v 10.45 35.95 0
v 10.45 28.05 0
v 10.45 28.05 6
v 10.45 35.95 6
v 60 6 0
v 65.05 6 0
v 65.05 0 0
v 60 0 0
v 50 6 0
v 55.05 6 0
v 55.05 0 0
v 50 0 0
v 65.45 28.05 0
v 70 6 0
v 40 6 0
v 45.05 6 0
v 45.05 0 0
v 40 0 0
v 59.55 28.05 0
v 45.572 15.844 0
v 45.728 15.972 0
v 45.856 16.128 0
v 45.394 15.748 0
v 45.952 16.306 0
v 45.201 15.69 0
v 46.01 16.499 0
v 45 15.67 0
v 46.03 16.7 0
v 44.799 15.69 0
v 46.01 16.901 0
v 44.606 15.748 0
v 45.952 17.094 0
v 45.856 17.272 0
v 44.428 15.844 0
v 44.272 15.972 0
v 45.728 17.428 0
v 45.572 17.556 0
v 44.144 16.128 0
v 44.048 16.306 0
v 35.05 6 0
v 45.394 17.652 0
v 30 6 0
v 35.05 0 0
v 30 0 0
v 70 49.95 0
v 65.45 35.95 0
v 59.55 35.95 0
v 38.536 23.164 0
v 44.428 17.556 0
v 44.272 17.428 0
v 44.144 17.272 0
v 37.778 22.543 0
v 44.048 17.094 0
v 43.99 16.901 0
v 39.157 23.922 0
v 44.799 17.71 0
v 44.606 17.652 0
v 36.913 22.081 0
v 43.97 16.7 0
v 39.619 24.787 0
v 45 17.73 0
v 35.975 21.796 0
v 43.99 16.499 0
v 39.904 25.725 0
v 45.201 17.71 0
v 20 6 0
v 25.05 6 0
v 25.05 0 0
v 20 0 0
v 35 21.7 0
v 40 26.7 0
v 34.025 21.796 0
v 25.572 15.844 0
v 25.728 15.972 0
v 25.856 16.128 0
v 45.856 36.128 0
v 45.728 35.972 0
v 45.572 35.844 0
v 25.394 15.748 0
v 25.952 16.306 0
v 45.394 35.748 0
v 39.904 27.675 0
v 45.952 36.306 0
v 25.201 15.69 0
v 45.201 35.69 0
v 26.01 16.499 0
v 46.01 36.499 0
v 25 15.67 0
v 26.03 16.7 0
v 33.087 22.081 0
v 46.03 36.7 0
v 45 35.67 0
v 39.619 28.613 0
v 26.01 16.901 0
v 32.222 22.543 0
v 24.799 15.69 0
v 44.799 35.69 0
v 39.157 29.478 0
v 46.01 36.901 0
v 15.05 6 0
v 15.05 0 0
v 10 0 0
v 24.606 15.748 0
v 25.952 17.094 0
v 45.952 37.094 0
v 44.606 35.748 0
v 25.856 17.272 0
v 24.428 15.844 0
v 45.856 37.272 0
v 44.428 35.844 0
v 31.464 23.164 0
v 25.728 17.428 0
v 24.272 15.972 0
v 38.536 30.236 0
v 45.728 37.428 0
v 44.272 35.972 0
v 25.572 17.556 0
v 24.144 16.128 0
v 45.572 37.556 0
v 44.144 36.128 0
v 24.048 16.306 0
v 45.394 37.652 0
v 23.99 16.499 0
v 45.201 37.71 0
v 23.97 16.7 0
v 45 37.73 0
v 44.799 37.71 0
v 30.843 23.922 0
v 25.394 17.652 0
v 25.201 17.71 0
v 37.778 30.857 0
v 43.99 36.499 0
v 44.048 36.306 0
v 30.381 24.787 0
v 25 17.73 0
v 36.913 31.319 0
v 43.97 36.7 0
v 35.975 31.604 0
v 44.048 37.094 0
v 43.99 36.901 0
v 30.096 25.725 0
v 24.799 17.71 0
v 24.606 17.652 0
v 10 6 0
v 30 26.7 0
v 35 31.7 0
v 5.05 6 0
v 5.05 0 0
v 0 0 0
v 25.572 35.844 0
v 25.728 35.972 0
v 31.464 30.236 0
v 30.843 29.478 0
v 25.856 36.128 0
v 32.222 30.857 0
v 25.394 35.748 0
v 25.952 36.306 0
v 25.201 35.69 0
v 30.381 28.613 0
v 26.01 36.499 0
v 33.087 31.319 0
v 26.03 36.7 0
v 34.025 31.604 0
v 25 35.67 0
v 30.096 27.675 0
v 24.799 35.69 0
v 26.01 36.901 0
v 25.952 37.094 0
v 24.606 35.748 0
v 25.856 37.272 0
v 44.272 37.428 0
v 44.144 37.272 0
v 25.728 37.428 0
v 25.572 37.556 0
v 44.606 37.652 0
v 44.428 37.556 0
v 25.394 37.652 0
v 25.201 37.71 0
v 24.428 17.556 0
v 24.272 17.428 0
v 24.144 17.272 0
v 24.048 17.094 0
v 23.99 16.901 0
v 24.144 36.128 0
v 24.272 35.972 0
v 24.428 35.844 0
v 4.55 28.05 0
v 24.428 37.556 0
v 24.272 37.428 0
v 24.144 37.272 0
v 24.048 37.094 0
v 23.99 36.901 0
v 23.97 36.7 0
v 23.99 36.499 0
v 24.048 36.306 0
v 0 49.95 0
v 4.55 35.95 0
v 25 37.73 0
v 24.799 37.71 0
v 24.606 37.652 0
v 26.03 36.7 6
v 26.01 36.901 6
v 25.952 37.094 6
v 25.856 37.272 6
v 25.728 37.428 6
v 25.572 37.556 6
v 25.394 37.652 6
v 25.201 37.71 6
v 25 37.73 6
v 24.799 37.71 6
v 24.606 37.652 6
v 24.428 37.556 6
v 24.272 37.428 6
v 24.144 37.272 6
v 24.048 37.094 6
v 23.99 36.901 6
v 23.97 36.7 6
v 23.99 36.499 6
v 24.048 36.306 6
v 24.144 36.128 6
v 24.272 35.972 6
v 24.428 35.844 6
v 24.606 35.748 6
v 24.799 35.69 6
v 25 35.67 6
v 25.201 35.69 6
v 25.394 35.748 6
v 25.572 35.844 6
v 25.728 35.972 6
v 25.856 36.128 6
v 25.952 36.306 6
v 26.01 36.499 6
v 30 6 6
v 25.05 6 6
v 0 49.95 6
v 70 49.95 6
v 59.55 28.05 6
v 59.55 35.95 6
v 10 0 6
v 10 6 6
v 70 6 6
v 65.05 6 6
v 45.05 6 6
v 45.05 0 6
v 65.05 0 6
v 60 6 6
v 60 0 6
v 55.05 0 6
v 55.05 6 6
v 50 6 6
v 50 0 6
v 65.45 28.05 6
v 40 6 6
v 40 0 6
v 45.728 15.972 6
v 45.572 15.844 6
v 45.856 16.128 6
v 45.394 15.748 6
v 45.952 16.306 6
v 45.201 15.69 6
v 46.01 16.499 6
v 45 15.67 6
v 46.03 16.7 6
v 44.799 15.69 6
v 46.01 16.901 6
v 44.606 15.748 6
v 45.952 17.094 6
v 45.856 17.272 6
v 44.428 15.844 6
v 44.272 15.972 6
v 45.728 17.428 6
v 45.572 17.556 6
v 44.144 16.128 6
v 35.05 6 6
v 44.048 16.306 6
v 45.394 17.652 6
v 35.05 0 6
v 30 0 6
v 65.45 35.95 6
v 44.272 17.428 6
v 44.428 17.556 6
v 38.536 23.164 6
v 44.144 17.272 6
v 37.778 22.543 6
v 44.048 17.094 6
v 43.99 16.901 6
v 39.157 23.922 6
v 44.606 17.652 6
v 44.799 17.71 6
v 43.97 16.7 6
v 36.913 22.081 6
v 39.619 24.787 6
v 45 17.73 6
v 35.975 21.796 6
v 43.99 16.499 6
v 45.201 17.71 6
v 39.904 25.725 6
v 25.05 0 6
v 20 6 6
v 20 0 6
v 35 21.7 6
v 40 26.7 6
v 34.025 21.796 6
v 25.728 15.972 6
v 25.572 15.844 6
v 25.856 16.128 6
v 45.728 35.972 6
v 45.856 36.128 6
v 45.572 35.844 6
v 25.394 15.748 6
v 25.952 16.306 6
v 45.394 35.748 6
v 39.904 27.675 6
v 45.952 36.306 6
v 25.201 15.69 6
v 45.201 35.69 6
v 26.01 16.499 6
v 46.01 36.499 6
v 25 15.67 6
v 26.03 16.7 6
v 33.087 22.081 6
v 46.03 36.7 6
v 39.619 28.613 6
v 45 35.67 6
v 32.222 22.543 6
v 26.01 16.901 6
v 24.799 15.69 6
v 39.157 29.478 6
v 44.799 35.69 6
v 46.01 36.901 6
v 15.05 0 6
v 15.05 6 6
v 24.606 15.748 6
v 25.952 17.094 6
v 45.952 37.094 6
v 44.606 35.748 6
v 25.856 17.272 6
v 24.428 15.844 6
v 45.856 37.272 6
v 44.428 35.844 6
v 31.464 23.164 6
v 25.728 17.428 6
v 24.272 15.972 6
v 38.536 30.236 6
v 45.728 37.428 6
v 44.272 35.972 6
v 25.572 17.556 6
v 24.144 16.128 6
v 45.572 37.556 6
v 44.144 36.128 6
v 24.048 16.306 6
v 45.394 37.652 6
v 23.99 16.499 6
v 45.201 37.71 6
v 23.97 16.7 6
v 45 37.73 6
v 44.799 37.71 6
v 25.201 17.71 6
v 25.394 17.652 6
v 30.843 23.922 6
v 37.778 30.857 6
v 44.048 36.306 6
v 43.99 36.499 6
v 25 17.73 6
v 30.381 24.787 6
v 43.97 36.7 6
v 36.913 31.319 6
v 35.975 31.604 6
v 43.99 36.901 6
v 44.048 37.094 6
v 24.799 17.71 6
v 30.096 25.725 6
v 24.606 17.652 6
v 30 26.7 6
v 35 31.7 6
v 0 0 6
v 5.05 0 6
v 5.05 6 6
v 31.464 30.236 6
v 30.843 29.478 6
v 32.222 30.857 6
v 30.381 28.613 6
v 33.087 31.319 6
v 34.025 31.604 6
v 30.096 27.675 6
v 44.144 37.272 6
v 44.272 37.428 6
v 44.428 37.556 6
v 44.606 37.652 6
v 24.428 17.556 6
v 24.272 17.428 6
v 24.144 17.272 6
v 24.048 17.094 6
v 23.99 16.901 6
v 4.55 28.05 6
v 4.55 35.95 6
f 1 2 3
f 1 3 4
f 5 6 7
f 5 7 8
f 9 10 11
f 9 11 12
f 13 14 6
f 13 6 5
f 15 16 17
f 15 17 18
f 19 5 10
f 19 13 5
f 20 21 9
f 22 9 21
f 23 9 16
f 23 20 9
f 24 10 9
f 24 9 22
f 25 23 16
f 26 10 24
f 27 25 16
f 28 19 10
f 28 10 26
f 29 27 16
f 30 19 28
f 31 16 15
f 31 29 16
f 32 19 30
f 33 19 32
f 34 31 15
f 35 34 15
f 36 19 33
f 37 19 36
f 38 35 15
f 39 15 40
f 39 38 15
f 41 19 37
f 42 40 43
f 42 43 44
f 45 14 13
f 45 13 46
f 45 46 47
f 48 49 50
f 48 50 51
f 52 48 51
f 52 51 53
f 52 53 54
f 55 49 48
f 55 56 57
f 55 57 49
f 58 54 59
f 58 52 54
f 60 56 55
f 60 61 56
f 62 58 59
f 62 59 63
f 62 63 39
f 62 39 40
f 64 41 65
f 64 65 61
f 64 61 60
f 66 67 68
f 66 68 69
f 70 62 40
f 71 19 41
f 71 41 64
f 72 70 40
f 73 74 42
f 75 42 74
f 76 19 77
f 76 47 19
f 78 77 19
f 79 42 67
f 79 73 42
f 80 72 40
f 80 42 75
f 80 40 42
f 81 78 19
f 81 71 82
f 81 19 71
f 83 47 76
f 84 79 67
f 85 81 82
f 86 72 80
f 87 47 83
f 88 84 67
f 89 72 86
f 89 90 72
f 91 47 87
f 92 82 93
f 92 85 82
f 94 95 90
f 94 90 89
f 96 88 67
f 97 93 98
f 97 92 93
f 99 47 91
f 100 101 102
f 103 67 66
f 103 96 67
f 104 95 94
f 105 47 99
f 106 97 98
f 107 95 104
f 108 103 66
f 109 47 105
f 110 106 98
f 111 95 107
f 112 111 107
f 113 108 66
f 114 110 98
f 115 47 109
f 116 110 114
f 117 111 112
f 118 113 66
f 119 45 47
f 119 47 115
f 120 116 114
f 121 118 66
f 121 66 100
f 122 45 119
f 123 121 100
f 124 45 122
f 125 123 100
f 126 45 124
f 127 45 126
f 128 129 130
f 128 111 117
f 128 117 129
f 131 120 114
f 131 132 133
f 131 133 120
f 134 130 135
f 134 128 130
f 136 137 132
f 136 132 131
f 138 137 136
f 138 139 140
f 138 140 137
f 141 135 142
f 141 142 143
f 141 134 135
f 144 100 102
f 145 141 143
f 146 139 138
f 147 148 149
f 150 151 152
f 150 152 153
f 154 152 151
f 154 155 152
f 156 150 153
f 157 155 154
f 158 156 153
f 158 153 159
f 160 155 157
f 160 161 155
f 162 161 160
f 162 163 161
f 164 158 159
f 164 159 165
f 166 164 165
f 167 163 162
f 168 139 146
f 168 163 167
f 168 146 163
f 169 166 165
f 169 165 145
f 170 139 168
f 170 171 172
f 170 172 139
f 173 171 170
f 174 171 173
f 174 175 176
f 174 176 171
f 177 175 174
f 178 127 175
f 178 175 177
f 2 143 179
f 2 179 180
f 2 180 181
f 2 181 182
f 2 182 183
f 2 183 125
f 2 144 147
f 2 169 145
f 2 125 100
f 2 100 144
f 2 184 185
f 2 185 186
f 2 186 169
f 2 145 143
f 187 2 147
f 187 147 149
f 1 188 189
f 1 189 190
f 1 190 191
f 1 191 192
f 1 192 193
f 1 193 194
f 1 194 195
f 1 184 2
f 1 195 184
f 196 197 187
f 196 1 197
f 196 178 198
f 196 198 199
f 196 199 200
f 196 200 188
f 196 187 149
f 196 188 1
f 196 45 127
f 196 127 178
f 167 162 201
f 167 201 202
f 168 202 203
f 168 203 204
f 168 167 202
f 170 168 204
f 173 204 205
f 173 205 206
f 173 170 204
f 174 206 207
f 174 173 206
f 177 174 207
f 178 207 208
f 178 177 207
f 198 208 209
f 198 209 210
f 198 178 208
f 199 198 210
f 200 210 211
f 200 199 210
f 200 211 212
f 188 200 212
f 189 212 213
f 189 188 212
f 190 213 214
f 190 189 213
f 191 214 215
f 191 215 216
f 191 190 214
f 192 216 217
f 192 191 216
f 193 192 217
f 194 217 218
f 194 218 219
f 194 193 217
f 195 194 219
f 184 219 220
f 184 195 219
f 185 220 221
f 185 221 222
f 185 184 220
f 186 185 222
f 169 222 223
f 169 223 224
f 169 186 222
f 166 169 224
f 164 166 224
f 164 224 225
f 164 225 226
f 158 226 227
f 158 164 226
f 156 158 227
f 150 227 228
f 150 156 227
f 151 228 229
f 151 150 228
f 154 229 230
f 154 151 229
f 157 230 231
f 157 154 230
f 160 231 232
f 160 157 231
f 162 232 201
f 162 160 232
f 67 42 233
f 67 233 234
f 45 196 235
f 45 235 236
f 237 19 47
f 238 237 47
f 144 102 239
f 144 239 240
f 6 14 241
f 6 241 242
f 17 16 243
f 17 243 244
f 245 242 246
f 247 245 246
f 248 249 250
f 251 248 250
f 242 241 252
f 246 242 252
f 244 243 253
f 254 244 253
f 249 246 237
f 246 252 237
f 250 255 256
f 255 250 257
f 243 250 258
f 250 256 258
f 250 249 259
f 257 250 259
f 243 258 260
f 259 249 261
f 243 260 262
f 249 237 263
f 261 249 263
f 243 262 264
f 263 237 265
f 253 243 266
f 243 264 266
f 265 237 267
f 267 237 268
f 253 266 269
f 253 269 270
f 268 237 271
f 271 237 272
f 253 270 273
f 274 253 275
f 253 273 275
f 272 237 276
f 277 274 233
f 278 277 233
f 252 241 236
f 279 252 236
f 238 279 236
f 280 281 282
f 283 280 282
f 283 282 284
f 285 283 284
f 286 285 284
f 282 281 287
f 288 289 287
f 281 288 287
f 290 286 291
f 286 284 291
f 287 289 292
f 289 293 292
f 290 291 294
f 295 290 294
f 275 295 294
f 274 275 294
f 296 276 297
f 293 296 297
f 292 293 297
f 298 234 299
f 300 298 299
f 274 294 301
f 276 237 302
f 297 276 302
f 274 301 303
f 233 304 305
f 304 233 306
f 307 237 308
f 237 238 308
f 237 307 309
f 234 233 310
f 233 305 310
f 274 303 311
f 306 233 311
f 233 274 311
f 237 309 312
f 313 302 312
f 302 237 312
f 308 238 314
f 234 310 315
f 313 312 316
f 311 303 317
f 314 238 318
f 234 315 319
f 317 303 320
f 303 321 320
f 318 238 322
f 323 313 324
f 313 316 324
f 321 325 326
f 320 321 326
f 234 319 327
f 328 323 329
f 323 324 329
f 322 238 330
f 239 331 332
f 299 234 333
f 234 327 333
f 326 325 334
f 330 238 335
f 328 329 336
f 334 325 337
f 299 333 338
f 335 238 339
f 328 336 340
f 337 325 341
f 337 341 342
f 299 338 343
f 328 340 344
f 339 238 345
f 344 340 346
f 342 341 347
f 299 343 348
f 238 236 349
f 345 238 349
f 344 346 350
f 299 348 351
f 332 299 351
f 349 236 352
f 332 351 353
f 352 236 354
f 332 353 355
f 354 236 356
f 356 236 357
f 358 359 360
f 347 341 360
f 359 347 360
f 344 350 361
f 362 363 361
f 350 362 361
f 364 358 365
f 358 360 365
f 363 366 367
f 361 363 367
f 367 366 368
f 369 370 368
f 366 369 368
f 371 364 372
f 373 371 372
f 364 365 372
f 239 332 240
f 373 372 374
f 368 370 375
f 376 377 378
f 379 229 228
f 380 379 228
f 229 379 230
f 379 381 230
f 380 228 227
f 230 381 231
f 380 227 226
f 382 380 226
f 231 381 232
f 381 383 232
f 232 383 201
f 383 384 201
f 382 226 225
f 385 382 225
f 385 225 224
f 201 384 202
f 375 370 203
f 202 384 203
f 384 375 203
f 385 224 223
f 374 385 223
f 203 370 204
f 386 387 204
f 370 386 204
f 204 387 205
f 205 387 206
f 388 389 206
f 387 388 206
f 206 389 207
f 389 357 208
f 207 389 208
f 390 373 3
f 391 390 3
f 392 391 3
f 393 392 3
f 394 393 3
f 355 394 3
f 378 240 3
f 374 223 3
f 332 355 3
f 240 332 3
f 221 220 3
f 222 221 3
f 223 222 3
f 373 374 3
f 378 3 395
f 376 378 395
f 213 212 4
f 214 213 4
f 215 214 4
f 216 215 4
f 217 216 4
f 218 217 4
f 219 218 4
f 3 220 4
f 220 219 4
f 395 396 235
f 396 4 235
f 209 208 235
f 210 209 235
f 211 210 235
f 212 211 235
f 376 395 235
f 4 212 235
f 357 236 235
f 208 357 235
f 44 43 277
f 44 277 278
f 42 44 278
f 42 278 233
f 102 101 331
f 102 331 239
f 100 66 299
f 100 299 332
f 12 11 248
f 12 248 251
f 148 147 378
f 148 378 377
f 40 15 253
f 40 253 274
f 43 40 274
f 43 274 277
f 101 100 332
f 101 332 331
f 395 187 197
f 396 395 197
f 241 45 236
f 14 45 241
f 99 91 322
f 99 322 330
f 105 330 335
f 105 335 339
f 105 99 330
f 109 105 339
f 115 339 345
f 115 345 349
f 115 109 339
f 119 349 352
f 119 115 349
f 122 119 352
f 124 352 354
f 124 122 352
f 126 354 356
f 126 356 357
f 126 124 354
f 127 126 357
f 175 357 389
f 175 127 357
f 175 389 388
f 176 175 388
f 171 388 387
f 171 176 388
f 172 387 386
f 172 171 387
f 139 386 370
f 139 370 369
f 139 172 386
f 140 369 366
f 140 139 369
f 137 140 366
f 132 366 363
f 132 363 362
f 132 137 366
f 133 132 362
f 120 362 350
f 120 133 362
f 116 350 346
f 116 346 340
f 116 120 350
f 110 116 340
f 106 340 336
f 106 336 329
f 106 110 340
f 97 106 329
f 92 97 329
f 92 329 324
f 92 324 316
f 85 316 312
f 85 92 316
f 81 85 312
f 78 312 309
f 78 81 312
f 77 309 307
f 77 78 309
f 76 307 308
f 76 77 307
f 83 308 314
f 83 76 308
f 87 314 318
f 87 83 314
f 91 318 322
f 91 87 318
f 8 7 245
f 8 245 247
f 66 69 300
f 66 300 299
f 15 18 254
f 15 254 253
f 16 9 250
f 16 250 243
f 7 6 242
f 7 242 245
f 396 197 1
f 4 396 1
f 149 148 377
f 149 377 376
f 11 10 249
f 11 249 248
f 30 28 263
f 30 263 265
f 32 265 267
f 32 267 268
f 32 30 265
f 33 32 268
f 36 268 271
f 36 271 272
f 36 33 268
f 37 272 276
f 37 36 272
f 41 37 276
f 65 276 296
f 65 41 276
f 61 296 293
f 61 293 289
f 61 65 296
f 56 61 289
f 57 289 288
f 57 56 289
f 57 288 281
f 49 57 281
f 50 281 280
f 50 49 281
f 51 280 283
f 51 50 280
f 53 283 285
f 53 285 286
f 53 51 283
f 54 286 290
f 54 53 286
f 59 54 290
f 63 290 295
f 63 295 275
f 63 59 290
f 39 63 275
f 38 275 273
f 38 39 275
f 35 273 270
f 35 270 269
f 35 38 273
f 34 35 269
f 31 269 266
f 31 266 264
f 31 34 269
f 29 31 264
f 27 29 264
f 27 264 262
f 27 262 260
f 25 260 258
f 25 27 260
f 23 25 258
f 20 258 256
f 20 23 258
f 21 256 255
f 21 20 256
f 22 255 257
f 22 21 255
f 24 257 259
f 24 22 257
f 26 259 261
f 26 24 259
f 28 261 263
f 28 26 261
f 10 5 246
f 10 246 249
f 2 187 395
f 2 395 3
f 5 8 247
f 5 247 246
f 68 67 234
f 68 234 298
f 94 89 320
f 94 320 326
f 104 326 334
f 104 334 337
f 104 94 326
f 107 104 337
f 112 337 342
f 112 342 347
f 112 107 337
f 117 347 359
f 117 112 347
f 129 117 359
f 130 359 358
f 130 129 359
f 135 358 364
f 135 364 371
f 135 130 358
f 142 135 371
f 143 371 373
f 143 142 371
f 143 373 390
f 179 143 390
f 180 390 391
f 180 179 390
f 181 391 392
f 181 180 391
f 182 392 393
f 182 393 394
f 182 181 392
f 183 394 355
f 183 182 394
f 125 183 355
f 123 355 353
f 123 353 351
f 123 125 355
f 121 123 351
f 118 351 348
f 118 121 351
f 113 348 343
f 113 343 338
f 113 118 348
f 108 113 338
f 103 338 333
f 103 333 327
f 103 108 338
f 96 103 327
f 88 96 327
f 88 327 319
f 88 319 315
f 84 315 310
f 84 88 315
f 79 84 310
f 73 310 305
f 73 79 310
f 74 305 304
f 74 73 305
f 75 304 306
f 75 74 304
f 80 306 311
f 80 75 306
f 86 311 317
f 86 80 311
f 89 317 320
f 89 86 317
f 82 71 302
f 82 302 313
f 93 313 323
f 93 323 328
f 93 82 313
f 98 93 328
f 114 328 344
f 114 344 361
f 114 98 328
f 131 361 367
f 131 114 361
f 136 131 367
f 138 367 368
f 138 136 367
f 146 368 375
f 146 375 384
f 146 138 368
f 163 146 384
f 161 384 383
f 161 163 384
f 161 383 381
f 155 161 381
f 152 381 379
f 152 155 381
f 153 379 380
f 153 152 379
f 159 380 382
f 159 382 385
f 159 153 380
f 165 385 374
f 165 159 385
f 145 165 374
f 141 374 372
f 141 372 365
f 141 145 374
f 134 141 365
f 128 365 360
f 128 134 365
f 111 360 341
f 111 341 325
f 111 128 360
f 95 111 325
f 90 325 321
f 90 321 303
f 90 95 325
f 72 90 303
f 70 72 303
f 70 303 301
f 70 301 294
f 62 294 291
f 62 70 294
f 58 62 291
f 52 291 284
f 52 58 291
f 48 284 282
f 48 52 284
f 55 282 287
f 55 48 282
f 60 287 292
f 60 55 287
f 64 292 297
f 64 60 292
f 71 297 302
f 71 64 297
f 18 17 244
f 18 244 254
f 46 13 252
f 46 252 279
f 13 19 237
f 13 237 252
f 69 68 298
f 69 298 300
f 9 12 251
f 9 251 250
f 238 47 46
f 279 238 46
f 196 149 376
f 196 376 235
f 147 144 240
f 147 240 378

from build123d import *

# Parameters (mm, degrees)
ESQUISSE1_R        = 1.03
ESQUISSE1_R_2      = 5
ESQUISSE1_W        = 5.9
ESQUISSE1_H        = 7.9
BOSS_EXTRU_1_DEPTH = 6


with BuildPart() as part:
    # Esquisse1 → Boss.-Extru.1 (new body)
    with BuildSketch(Plane.XY):
        Polygon((0, 0), (0, 49.95), (70, 49.95), (70, 6), (65.05, 6), (65.05, 0), (60, 0), (60, 6), (55.05, 6), (55.05, 0), (50, 0), (50, 6), (45.05, 6), (45.05, 0), (40, 0), (40, 6), (35.05, 6), (35.05, 0), (30, 0), (30, 6), (25.05, 6), (25.05, 0), (20, 0), (20, 6), (15.05, 6), (15.05, 0), (10, 0), (10, 6), (5.05, 6), (5.05, 0), align=None)
        with Locations((25, 36.7)):
            Circle(ESQUISSE1_R, mode=Mode.SUBTRACT)
        with Locations((45, 36.7)):
            Circle(ESQUISSE1_R, mode=Mode.SUBTRACT)
        with Locations((25, 16.7)):
            Circle(ESQUISSE1_R, mode=Mode.SUBTRACT)
        with Locations((45, 16.7)):
            Circle(ESQUISSE1_R, mode=Mode.SUBTRACT)
        with Locations((35, 26.7)):
            Circle(ESQUISSE1_R_2, mode=Mode.SUBTRACT)
        with Locations((7.5, 32)):
            Rectangle(ESQUISSE1_W, ESQUISSE1_H, mode=Mode.SUBTRACT)
        with Locations((62.5, 32)):
            Rectangle(ESQUISSE1_W, ESQUISSE1_H, mode=Mode.SUBTRACT)
    extrude(amount=BOSS_EXTRU_1_DEPTH)


solid = part.part
